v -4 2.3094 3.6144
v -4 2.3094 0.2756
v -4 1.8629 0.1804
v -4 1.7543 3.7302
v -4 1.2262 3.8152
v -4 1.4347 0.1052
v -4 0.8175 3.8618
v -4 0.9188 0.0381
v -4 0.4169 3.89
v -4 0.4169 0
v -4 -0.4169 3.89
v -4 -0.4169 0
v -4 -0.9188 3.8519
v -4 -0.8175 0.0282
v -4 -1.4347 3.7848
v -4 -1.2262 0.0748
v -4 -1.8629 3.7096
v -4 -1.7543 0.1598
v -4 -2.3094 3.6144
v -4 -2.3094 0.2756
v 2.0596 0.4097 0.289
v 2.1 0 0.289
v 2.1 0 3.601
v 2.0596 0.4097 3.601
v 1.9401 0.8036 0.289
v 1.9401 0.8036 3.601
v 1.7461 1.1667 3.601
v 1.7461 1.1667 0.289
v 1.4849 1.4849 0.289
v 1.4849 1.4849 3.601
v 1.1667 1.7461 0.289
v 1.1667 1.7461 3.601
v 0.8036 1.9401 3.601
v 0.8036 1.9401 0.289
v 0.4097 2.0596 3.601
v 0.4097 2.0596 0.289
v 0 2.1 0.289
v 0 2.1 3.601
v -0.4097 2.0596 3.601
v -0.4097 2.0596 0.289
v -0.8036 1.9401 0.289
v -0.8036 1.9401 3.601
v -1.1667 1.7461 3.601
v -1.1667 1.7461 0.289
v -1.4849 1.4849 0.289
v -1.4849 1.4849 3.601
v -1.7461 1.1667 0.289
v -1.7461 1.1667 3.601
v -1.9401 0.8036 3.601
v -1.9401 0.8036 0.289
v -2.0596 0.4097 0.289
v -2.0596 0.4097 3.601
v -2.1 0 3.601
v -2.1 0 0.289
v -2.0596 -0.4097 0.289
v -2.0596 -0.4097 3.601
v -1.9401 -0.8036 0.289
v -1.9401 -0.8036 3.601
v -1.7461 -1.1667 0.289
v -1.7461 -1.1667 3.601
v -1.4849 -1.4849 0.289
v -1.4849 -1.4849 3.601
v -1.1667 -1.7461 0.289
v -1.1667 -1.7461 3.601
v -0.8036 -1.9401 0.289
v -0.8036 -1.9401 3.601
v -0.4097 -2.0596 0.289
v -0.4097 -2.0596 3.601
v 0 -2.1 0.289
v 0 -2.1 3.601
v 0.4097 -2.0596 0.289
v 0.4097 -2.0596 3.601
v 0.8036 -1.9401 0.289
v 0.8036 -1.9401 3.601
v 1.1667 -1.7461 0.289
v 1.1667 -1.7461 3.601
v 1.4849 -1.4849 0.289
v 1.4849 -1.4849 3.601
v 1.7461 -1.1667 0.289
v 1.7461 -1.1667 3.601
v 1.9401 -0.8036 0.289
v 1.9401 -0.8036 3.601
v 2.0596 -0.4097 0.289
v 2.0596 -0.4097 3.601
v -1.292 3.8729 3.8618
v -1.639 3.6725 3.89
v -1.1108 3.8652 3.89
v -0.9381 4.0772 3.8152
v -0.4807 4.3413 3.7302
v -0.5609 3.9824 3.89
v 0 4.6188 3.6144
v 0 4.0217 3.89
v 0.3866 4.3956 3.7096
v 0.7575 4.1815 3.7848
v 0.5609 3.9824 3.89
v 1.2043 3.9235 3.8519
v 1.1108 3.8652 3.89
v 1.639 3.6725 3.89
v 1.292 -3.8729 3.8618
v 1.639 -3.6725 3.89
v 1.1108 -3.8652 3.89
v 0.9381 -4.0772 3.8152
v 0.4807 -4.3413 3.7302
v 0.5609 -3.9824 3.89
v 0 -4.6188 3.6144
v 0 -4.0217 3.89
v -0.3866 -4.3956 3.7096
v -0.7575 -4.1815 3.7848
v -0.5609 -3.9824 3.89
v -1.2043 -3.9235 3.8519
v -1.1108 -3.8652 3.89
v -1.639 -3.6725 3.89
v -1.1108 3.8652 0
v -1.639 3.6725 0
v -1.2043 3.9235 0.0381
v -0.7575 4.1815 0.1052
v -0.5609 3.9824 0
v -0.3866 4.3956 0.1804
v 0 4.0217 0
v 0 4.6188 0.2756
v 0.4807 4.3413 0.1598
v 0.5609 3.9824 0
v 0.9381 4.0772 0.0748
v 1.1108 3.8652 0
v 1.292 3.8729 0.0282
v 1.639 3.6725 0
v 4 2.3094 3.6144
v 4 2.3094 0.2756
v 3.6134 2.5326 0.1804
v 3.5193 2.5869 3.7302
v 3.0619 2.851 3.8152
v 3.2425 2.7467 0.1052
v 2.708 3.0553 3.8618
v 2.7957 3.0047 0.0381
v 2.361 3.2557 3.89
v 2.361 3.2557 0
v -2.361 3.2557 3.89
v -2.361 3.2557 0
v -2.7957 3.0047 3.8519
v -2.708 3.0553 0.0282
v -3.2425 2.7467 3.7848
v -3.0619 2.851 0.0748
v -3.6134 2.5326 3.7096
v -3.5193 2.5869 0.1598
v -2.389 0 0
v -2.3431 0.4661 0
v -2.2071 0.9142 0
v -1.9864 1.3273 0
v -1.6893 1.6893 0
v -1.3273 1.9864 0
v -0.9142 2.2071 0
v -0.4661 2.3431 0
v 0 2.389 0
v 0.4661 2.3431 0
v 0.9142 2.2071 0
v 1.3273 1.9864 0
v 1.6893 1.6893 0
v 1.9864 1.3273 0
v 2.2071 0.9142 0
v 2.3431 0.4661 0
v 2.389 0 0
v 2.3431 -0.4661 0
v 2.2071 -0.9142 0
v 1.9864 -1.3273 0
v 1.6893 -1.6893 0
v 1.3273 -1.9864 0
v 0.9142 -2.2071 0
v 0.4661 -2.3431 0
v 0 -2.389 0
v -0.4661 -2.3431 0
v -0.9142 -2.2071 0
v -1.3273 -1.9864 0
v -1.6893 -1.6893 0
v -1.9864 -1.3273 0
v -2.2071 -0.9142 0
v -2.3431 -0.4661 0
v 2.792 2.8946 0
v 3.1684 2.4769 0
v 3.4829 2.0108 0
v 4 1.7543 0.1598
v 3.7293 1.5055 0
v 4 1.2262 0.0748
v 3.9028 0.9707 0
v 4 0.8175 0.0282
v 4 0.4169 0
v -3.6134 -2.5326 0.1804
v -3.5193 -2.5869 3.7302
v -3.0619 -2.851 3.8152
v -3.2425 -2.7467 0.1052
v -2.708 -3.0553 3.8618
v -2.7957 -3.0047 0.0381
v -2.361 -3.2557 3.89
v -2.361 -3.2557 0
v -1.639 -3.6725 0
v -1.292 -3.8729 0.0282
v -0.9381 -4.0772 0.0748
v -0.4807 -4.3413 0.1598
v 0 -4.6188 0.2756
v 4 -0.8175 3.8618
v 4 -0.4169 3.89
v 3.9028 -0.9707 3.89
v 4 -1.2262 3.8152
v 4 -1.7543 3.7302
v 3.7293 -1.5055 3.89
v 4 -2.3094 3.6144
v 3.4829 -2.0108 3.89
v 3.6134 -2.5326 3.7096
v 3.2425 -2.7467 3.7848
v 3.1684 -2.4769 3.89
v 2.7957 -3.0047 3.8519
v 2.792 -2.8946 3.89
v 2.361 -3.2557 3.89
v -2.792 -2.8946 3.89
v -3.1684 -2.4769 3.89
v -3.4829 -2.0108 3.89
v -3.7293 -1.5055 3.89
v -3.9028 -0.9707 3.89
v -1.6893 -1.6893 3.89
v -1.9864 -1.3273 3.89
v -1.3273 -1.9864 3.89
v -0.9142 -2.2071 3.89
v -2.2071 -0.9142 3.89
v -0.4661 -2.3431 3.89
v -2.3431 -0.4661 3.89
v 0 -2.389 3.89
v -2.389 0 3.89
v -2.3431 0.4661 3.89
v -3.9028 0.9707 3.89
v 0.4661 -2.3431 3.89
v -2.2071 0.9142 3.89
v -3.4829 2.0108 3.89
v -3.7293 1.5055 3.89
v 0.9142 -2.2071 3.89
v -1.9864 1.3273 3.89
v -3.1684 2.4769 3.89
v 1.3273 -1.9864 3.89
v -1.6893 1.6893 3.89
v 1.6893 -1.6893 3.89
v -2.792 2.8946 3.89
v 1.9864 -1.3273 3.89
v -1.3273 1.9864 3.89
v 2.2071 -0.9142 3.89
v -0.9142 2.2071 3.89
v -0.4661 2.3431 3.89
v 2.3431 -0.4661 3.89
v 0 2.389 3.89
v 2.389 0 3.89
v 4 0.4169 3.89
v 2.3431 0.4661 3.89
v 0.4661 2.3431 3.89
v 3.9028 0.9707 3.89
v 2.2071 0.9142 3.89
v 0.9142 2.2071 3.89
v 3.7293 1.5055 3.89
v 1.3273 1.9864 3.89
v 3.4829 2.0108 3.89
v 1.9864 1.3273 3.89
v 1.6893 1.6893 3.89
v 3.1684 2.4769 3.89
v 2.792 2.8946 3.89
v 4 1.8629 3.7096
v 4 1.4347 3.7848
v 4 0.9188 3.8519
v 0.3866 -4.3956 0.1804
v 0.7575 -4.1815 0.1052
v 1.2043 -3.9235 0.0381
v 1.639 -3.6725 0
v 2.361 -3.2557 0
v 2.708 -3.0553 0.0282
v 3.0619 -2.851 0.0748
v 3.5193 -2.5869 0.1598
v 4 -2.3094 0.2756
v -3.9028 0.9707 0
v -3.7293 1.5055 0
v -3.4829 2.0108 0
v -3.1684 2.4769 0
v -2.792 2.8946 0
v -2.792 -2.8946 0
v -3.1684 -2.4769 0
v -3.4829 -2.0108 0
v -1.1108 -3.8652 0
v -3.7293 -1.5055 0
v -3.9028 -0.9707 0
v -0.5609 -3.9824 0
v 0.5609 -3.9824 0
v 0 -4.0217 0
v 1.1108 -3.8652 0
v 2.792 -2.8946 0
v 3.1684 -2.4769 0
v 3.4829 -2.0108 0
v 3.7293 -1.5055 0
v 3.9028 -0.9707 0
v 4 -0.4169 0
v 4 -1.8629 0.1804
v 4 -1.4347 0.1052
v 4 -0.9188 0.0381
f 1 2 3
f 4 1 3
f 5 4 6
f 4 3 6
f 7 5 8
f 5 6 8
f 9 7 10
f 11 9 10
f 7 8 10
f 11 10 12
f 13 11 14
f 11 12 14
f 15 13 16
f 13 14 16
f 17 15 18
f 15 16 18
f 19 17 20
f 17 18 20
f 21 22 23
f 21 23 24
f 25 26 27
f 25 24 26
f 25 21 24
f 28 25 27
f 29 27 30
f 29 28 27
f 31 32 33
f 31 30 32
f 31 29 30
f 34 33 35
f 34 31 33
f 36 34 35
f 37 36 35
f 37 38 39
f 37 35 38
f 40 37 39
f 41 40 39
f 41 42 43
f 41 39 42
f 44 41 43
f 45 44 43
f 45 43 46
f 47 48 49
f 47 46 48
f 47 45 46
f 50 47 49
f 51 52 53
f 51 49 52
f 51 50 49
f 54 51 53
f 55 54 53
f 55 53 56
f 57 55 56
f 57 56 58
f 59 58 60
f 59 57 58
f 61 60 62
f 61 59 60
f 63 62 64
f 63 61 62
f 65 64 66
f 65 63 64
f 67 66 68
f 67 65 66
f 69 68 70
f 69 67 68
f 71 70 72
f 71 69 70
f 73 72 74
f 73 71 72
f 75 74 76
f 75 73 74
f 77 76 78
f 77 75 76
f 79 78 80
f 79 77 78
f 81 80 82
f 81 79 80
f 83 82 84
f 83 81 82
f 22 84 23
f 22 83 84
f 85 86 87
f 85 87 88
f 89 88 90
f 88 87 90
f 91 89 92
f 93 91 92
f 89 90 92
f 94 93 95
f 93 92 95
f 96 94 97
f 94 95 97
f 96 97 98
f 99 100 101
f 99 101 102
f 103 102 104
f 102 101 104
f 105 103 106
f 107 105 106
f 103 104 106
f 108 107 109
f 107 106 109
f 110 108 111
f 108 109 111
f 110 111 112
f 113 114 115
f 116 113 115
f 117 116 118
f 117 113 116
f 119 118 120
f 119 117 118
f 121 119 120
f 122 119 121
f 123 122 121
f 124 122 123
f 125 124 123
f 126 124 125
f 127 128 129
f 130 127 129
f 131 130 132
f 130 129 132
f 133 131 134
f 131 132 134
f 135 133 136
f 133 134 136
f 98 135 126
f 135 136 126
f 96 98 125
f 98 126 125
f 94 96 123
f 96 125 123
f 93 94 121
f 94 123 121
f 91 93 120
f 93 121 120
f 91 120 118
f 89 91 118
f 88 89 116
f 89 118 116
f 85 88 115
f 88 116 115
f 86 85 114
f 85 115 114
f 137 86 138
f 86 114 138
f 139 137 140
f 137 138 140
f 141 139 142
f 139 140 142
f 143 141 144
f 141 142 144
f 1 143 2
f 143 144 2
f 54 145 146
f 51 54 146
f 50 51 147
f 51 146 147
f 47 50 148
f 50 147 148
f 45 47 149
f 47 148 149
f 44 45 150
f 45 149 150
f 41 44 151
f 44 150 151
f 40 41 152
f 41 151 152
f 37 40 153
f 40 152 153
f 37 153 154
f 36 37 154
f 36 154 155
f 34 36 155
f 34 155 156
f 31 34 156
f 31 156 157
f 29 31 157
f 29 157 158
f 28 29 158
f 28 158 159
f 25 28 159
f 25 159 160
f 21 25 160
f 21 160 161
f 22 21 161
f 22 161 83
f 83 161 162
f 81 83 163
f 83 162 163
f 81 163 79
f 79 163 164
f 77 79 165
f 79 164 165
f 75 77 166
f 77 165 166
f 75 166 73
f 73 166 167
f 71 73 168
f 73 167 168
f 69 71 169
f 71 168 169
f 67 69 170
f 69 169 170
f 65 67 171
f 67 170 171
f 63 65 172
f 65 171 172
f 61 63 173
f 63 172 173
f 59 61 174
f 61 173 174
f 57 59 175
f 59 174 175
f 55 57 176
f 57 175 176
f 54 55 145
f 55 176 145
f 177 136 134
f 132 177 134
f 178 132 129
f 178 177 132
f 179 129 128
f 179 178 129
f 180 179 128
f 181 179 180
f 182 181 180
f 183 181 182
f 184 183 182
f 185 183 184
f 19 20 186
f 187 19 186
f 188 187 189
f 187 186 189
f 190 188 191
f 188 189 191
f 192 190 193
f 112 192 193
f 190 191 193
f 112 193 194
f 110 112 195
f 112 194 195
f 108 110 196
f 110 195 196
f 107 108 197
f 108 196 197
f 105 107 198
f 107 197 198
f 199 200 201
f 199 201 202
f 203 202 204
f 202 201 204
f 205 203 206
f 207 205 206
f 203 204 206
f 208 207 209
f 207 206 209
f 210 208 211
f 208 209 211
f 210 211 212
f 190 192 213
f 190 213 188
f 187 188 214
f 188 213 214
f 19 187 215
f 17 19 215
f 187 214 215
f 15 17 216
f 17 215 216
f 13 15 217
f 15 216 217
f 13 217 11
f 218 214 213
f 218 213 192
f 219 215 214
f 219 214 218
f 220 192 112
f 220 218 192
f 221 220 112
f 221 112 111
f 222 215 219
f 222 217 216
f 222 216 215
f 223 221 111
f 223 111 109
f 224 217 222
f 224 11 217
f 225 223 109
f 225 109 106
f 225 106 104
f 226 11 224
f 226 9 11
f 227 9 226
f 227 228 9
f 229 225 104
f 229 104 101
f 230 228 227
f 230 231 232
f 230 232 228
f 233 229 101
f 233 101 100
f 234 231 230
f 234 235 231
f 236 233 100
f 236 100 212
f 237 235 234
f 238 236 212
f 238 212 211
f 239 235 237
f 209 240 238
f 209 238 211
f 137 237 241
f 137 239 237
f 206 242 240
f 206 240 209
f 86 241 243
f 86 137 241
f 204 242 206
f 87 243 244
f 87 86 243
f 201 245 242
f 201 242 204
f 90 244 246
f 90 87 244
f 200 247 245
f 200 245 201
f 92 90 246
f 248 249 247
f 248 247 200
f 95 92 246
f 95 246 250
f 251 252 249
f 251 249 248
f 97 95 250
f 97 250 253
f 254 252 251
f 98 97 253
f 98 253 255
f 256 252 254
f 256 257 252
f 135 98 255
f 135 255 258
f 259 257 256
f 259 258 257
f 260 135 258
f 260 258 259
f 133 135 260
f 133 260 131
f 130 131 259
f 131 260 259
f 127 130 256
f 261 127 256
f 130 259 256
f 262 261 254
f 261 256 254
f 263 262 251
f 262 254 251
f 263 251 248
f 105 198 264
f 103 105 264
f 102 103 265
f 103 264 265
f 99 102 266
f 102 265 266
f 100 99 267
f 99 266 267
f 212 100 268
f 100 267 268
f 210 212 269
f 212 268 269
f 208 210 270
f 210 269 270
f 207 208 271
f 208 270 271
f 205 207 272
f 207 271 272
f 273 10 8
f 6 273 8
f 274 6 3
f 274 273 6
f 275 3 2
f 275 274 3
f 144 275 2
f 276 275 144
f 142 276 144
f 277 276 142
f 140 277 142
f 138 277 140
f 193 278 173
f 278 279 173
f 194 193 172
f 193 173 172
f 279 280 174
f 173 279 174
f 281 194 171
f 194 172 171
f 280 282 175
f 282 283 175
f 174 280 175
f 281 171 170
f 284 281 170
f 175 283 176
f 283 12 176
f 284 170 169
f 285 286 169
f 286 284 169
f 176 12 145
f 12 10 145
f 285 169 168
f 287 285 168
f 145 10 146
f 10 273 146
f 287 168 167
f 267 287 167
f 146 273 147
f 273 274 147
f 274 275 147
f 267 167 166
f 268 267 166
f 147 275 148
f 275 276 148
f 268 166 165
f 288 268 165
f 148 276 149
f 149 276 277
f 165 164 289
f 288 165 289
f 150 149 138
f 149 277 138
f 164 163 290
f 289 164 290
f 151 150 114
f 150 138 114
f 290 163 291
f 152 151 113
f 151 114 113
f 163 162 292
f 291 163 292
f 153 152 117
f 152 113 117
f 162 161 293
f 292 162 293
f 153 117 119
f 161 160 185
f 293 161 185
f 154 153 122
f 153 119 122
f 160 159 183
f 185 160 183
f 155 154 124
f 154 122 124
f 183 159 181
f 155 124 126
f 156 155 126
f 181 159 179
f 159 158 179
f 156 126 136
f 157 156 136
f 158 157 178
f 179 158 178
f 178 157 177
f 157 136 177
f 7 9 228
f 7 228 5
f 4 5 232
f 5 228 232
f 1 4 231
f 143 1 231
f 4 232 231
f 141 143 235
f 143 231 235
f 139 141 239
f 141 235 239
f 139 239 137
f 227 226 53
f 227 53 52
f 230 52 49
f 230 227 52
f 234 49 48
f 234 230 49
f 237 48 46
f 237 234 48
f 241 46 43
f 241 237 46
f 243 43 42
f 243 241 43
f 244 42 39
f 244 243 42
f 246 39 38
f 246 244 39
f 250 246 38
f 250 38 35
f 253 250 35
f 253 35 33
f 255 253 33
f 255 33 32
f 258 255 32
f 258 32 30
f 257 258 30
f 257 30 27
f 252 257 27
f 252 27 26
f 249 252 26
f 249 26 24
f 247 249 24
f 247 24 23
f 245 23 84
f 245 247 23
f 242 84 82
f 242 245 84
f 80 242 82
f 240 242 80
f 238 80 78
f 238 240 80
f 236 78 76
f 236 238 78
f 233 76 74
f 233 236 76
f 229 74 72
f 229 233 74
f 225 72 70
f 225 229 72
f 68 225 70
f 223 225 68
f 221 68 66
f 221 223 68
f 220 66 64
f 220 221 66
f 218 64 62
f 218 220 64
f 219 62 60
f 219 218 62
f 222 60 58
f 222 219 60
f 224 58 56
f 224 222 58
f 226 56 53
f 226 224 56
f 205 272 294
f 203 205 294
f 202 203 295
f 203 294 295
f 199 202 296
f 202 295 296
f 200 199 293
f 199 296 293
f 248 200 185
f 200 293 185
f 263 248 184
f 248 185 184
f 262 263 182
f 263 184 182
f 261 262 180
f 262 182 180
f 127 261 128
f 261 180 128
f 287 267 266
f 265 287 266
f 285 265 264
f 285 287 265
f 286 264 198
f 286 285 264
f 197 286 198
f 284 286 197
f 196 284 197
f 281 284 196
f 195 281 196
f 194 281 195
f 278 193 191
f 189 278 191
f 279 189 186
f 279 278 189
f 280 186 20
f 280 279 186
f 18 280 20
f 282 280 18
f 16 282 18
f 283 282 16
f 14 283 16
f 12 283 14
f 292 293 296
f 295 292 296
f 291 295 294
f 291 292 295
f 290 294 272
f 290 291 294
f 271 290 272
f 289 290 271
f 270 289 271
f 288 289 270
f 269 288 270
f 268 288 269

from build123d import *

# Parameters (mm, degrees)
SKETCH_1_R      = 2.1
EXTRUDE_1_DEPTH = 3.89


with BuildPart() as part:
    # 스케치1 → 보스-돌출1 (new body)
    with BuildSketch(Plane.XY):
        Polygon((0, 4.618802154), (-4, 2.309401077), (-4, -2.309401077), (0, -4.618802154), (4, -2.309401077), (4, 2.309401077), align=None)
        Circle(SKETCH_1_R, mode=Mode.SUBTRACT)
    extrude(amount=EXTRUDE_1_DEPTH)

    # 스케치3 → 컷-회전3 (revolve, cut)
    with BuildSketch(Plane(origin=(0, 0, 0), x_dir=(1, 0, 0), z_dir=(0, 1, 0)), mode=Mode.PRIVATE) as cut_revolve_3_sk:
        Polygon((2.09, 0.001), (2.09, -0.299), (2.39, 0.001), align=None)
        Polygon((4, 0.01), (4.65, 0.01), (4.65, -0.29), align=None)
        Polygon((4.65, -3.6), (4, -3.9), (4.65, -3.9), align=None)
        Polygon((2.39, -3.891), (2.09, -3.891), (2.09, -3.591), align=None)
    revolve(cut_revolve_3_sk.sketch.rotate(Axis((0, 0, 1.945), (0, 0, -1)), 180), axis=Axis((0, 0, 1.945), (0, 0, -1)), mode=Mode.SUBTRACT)


solid = part.part
